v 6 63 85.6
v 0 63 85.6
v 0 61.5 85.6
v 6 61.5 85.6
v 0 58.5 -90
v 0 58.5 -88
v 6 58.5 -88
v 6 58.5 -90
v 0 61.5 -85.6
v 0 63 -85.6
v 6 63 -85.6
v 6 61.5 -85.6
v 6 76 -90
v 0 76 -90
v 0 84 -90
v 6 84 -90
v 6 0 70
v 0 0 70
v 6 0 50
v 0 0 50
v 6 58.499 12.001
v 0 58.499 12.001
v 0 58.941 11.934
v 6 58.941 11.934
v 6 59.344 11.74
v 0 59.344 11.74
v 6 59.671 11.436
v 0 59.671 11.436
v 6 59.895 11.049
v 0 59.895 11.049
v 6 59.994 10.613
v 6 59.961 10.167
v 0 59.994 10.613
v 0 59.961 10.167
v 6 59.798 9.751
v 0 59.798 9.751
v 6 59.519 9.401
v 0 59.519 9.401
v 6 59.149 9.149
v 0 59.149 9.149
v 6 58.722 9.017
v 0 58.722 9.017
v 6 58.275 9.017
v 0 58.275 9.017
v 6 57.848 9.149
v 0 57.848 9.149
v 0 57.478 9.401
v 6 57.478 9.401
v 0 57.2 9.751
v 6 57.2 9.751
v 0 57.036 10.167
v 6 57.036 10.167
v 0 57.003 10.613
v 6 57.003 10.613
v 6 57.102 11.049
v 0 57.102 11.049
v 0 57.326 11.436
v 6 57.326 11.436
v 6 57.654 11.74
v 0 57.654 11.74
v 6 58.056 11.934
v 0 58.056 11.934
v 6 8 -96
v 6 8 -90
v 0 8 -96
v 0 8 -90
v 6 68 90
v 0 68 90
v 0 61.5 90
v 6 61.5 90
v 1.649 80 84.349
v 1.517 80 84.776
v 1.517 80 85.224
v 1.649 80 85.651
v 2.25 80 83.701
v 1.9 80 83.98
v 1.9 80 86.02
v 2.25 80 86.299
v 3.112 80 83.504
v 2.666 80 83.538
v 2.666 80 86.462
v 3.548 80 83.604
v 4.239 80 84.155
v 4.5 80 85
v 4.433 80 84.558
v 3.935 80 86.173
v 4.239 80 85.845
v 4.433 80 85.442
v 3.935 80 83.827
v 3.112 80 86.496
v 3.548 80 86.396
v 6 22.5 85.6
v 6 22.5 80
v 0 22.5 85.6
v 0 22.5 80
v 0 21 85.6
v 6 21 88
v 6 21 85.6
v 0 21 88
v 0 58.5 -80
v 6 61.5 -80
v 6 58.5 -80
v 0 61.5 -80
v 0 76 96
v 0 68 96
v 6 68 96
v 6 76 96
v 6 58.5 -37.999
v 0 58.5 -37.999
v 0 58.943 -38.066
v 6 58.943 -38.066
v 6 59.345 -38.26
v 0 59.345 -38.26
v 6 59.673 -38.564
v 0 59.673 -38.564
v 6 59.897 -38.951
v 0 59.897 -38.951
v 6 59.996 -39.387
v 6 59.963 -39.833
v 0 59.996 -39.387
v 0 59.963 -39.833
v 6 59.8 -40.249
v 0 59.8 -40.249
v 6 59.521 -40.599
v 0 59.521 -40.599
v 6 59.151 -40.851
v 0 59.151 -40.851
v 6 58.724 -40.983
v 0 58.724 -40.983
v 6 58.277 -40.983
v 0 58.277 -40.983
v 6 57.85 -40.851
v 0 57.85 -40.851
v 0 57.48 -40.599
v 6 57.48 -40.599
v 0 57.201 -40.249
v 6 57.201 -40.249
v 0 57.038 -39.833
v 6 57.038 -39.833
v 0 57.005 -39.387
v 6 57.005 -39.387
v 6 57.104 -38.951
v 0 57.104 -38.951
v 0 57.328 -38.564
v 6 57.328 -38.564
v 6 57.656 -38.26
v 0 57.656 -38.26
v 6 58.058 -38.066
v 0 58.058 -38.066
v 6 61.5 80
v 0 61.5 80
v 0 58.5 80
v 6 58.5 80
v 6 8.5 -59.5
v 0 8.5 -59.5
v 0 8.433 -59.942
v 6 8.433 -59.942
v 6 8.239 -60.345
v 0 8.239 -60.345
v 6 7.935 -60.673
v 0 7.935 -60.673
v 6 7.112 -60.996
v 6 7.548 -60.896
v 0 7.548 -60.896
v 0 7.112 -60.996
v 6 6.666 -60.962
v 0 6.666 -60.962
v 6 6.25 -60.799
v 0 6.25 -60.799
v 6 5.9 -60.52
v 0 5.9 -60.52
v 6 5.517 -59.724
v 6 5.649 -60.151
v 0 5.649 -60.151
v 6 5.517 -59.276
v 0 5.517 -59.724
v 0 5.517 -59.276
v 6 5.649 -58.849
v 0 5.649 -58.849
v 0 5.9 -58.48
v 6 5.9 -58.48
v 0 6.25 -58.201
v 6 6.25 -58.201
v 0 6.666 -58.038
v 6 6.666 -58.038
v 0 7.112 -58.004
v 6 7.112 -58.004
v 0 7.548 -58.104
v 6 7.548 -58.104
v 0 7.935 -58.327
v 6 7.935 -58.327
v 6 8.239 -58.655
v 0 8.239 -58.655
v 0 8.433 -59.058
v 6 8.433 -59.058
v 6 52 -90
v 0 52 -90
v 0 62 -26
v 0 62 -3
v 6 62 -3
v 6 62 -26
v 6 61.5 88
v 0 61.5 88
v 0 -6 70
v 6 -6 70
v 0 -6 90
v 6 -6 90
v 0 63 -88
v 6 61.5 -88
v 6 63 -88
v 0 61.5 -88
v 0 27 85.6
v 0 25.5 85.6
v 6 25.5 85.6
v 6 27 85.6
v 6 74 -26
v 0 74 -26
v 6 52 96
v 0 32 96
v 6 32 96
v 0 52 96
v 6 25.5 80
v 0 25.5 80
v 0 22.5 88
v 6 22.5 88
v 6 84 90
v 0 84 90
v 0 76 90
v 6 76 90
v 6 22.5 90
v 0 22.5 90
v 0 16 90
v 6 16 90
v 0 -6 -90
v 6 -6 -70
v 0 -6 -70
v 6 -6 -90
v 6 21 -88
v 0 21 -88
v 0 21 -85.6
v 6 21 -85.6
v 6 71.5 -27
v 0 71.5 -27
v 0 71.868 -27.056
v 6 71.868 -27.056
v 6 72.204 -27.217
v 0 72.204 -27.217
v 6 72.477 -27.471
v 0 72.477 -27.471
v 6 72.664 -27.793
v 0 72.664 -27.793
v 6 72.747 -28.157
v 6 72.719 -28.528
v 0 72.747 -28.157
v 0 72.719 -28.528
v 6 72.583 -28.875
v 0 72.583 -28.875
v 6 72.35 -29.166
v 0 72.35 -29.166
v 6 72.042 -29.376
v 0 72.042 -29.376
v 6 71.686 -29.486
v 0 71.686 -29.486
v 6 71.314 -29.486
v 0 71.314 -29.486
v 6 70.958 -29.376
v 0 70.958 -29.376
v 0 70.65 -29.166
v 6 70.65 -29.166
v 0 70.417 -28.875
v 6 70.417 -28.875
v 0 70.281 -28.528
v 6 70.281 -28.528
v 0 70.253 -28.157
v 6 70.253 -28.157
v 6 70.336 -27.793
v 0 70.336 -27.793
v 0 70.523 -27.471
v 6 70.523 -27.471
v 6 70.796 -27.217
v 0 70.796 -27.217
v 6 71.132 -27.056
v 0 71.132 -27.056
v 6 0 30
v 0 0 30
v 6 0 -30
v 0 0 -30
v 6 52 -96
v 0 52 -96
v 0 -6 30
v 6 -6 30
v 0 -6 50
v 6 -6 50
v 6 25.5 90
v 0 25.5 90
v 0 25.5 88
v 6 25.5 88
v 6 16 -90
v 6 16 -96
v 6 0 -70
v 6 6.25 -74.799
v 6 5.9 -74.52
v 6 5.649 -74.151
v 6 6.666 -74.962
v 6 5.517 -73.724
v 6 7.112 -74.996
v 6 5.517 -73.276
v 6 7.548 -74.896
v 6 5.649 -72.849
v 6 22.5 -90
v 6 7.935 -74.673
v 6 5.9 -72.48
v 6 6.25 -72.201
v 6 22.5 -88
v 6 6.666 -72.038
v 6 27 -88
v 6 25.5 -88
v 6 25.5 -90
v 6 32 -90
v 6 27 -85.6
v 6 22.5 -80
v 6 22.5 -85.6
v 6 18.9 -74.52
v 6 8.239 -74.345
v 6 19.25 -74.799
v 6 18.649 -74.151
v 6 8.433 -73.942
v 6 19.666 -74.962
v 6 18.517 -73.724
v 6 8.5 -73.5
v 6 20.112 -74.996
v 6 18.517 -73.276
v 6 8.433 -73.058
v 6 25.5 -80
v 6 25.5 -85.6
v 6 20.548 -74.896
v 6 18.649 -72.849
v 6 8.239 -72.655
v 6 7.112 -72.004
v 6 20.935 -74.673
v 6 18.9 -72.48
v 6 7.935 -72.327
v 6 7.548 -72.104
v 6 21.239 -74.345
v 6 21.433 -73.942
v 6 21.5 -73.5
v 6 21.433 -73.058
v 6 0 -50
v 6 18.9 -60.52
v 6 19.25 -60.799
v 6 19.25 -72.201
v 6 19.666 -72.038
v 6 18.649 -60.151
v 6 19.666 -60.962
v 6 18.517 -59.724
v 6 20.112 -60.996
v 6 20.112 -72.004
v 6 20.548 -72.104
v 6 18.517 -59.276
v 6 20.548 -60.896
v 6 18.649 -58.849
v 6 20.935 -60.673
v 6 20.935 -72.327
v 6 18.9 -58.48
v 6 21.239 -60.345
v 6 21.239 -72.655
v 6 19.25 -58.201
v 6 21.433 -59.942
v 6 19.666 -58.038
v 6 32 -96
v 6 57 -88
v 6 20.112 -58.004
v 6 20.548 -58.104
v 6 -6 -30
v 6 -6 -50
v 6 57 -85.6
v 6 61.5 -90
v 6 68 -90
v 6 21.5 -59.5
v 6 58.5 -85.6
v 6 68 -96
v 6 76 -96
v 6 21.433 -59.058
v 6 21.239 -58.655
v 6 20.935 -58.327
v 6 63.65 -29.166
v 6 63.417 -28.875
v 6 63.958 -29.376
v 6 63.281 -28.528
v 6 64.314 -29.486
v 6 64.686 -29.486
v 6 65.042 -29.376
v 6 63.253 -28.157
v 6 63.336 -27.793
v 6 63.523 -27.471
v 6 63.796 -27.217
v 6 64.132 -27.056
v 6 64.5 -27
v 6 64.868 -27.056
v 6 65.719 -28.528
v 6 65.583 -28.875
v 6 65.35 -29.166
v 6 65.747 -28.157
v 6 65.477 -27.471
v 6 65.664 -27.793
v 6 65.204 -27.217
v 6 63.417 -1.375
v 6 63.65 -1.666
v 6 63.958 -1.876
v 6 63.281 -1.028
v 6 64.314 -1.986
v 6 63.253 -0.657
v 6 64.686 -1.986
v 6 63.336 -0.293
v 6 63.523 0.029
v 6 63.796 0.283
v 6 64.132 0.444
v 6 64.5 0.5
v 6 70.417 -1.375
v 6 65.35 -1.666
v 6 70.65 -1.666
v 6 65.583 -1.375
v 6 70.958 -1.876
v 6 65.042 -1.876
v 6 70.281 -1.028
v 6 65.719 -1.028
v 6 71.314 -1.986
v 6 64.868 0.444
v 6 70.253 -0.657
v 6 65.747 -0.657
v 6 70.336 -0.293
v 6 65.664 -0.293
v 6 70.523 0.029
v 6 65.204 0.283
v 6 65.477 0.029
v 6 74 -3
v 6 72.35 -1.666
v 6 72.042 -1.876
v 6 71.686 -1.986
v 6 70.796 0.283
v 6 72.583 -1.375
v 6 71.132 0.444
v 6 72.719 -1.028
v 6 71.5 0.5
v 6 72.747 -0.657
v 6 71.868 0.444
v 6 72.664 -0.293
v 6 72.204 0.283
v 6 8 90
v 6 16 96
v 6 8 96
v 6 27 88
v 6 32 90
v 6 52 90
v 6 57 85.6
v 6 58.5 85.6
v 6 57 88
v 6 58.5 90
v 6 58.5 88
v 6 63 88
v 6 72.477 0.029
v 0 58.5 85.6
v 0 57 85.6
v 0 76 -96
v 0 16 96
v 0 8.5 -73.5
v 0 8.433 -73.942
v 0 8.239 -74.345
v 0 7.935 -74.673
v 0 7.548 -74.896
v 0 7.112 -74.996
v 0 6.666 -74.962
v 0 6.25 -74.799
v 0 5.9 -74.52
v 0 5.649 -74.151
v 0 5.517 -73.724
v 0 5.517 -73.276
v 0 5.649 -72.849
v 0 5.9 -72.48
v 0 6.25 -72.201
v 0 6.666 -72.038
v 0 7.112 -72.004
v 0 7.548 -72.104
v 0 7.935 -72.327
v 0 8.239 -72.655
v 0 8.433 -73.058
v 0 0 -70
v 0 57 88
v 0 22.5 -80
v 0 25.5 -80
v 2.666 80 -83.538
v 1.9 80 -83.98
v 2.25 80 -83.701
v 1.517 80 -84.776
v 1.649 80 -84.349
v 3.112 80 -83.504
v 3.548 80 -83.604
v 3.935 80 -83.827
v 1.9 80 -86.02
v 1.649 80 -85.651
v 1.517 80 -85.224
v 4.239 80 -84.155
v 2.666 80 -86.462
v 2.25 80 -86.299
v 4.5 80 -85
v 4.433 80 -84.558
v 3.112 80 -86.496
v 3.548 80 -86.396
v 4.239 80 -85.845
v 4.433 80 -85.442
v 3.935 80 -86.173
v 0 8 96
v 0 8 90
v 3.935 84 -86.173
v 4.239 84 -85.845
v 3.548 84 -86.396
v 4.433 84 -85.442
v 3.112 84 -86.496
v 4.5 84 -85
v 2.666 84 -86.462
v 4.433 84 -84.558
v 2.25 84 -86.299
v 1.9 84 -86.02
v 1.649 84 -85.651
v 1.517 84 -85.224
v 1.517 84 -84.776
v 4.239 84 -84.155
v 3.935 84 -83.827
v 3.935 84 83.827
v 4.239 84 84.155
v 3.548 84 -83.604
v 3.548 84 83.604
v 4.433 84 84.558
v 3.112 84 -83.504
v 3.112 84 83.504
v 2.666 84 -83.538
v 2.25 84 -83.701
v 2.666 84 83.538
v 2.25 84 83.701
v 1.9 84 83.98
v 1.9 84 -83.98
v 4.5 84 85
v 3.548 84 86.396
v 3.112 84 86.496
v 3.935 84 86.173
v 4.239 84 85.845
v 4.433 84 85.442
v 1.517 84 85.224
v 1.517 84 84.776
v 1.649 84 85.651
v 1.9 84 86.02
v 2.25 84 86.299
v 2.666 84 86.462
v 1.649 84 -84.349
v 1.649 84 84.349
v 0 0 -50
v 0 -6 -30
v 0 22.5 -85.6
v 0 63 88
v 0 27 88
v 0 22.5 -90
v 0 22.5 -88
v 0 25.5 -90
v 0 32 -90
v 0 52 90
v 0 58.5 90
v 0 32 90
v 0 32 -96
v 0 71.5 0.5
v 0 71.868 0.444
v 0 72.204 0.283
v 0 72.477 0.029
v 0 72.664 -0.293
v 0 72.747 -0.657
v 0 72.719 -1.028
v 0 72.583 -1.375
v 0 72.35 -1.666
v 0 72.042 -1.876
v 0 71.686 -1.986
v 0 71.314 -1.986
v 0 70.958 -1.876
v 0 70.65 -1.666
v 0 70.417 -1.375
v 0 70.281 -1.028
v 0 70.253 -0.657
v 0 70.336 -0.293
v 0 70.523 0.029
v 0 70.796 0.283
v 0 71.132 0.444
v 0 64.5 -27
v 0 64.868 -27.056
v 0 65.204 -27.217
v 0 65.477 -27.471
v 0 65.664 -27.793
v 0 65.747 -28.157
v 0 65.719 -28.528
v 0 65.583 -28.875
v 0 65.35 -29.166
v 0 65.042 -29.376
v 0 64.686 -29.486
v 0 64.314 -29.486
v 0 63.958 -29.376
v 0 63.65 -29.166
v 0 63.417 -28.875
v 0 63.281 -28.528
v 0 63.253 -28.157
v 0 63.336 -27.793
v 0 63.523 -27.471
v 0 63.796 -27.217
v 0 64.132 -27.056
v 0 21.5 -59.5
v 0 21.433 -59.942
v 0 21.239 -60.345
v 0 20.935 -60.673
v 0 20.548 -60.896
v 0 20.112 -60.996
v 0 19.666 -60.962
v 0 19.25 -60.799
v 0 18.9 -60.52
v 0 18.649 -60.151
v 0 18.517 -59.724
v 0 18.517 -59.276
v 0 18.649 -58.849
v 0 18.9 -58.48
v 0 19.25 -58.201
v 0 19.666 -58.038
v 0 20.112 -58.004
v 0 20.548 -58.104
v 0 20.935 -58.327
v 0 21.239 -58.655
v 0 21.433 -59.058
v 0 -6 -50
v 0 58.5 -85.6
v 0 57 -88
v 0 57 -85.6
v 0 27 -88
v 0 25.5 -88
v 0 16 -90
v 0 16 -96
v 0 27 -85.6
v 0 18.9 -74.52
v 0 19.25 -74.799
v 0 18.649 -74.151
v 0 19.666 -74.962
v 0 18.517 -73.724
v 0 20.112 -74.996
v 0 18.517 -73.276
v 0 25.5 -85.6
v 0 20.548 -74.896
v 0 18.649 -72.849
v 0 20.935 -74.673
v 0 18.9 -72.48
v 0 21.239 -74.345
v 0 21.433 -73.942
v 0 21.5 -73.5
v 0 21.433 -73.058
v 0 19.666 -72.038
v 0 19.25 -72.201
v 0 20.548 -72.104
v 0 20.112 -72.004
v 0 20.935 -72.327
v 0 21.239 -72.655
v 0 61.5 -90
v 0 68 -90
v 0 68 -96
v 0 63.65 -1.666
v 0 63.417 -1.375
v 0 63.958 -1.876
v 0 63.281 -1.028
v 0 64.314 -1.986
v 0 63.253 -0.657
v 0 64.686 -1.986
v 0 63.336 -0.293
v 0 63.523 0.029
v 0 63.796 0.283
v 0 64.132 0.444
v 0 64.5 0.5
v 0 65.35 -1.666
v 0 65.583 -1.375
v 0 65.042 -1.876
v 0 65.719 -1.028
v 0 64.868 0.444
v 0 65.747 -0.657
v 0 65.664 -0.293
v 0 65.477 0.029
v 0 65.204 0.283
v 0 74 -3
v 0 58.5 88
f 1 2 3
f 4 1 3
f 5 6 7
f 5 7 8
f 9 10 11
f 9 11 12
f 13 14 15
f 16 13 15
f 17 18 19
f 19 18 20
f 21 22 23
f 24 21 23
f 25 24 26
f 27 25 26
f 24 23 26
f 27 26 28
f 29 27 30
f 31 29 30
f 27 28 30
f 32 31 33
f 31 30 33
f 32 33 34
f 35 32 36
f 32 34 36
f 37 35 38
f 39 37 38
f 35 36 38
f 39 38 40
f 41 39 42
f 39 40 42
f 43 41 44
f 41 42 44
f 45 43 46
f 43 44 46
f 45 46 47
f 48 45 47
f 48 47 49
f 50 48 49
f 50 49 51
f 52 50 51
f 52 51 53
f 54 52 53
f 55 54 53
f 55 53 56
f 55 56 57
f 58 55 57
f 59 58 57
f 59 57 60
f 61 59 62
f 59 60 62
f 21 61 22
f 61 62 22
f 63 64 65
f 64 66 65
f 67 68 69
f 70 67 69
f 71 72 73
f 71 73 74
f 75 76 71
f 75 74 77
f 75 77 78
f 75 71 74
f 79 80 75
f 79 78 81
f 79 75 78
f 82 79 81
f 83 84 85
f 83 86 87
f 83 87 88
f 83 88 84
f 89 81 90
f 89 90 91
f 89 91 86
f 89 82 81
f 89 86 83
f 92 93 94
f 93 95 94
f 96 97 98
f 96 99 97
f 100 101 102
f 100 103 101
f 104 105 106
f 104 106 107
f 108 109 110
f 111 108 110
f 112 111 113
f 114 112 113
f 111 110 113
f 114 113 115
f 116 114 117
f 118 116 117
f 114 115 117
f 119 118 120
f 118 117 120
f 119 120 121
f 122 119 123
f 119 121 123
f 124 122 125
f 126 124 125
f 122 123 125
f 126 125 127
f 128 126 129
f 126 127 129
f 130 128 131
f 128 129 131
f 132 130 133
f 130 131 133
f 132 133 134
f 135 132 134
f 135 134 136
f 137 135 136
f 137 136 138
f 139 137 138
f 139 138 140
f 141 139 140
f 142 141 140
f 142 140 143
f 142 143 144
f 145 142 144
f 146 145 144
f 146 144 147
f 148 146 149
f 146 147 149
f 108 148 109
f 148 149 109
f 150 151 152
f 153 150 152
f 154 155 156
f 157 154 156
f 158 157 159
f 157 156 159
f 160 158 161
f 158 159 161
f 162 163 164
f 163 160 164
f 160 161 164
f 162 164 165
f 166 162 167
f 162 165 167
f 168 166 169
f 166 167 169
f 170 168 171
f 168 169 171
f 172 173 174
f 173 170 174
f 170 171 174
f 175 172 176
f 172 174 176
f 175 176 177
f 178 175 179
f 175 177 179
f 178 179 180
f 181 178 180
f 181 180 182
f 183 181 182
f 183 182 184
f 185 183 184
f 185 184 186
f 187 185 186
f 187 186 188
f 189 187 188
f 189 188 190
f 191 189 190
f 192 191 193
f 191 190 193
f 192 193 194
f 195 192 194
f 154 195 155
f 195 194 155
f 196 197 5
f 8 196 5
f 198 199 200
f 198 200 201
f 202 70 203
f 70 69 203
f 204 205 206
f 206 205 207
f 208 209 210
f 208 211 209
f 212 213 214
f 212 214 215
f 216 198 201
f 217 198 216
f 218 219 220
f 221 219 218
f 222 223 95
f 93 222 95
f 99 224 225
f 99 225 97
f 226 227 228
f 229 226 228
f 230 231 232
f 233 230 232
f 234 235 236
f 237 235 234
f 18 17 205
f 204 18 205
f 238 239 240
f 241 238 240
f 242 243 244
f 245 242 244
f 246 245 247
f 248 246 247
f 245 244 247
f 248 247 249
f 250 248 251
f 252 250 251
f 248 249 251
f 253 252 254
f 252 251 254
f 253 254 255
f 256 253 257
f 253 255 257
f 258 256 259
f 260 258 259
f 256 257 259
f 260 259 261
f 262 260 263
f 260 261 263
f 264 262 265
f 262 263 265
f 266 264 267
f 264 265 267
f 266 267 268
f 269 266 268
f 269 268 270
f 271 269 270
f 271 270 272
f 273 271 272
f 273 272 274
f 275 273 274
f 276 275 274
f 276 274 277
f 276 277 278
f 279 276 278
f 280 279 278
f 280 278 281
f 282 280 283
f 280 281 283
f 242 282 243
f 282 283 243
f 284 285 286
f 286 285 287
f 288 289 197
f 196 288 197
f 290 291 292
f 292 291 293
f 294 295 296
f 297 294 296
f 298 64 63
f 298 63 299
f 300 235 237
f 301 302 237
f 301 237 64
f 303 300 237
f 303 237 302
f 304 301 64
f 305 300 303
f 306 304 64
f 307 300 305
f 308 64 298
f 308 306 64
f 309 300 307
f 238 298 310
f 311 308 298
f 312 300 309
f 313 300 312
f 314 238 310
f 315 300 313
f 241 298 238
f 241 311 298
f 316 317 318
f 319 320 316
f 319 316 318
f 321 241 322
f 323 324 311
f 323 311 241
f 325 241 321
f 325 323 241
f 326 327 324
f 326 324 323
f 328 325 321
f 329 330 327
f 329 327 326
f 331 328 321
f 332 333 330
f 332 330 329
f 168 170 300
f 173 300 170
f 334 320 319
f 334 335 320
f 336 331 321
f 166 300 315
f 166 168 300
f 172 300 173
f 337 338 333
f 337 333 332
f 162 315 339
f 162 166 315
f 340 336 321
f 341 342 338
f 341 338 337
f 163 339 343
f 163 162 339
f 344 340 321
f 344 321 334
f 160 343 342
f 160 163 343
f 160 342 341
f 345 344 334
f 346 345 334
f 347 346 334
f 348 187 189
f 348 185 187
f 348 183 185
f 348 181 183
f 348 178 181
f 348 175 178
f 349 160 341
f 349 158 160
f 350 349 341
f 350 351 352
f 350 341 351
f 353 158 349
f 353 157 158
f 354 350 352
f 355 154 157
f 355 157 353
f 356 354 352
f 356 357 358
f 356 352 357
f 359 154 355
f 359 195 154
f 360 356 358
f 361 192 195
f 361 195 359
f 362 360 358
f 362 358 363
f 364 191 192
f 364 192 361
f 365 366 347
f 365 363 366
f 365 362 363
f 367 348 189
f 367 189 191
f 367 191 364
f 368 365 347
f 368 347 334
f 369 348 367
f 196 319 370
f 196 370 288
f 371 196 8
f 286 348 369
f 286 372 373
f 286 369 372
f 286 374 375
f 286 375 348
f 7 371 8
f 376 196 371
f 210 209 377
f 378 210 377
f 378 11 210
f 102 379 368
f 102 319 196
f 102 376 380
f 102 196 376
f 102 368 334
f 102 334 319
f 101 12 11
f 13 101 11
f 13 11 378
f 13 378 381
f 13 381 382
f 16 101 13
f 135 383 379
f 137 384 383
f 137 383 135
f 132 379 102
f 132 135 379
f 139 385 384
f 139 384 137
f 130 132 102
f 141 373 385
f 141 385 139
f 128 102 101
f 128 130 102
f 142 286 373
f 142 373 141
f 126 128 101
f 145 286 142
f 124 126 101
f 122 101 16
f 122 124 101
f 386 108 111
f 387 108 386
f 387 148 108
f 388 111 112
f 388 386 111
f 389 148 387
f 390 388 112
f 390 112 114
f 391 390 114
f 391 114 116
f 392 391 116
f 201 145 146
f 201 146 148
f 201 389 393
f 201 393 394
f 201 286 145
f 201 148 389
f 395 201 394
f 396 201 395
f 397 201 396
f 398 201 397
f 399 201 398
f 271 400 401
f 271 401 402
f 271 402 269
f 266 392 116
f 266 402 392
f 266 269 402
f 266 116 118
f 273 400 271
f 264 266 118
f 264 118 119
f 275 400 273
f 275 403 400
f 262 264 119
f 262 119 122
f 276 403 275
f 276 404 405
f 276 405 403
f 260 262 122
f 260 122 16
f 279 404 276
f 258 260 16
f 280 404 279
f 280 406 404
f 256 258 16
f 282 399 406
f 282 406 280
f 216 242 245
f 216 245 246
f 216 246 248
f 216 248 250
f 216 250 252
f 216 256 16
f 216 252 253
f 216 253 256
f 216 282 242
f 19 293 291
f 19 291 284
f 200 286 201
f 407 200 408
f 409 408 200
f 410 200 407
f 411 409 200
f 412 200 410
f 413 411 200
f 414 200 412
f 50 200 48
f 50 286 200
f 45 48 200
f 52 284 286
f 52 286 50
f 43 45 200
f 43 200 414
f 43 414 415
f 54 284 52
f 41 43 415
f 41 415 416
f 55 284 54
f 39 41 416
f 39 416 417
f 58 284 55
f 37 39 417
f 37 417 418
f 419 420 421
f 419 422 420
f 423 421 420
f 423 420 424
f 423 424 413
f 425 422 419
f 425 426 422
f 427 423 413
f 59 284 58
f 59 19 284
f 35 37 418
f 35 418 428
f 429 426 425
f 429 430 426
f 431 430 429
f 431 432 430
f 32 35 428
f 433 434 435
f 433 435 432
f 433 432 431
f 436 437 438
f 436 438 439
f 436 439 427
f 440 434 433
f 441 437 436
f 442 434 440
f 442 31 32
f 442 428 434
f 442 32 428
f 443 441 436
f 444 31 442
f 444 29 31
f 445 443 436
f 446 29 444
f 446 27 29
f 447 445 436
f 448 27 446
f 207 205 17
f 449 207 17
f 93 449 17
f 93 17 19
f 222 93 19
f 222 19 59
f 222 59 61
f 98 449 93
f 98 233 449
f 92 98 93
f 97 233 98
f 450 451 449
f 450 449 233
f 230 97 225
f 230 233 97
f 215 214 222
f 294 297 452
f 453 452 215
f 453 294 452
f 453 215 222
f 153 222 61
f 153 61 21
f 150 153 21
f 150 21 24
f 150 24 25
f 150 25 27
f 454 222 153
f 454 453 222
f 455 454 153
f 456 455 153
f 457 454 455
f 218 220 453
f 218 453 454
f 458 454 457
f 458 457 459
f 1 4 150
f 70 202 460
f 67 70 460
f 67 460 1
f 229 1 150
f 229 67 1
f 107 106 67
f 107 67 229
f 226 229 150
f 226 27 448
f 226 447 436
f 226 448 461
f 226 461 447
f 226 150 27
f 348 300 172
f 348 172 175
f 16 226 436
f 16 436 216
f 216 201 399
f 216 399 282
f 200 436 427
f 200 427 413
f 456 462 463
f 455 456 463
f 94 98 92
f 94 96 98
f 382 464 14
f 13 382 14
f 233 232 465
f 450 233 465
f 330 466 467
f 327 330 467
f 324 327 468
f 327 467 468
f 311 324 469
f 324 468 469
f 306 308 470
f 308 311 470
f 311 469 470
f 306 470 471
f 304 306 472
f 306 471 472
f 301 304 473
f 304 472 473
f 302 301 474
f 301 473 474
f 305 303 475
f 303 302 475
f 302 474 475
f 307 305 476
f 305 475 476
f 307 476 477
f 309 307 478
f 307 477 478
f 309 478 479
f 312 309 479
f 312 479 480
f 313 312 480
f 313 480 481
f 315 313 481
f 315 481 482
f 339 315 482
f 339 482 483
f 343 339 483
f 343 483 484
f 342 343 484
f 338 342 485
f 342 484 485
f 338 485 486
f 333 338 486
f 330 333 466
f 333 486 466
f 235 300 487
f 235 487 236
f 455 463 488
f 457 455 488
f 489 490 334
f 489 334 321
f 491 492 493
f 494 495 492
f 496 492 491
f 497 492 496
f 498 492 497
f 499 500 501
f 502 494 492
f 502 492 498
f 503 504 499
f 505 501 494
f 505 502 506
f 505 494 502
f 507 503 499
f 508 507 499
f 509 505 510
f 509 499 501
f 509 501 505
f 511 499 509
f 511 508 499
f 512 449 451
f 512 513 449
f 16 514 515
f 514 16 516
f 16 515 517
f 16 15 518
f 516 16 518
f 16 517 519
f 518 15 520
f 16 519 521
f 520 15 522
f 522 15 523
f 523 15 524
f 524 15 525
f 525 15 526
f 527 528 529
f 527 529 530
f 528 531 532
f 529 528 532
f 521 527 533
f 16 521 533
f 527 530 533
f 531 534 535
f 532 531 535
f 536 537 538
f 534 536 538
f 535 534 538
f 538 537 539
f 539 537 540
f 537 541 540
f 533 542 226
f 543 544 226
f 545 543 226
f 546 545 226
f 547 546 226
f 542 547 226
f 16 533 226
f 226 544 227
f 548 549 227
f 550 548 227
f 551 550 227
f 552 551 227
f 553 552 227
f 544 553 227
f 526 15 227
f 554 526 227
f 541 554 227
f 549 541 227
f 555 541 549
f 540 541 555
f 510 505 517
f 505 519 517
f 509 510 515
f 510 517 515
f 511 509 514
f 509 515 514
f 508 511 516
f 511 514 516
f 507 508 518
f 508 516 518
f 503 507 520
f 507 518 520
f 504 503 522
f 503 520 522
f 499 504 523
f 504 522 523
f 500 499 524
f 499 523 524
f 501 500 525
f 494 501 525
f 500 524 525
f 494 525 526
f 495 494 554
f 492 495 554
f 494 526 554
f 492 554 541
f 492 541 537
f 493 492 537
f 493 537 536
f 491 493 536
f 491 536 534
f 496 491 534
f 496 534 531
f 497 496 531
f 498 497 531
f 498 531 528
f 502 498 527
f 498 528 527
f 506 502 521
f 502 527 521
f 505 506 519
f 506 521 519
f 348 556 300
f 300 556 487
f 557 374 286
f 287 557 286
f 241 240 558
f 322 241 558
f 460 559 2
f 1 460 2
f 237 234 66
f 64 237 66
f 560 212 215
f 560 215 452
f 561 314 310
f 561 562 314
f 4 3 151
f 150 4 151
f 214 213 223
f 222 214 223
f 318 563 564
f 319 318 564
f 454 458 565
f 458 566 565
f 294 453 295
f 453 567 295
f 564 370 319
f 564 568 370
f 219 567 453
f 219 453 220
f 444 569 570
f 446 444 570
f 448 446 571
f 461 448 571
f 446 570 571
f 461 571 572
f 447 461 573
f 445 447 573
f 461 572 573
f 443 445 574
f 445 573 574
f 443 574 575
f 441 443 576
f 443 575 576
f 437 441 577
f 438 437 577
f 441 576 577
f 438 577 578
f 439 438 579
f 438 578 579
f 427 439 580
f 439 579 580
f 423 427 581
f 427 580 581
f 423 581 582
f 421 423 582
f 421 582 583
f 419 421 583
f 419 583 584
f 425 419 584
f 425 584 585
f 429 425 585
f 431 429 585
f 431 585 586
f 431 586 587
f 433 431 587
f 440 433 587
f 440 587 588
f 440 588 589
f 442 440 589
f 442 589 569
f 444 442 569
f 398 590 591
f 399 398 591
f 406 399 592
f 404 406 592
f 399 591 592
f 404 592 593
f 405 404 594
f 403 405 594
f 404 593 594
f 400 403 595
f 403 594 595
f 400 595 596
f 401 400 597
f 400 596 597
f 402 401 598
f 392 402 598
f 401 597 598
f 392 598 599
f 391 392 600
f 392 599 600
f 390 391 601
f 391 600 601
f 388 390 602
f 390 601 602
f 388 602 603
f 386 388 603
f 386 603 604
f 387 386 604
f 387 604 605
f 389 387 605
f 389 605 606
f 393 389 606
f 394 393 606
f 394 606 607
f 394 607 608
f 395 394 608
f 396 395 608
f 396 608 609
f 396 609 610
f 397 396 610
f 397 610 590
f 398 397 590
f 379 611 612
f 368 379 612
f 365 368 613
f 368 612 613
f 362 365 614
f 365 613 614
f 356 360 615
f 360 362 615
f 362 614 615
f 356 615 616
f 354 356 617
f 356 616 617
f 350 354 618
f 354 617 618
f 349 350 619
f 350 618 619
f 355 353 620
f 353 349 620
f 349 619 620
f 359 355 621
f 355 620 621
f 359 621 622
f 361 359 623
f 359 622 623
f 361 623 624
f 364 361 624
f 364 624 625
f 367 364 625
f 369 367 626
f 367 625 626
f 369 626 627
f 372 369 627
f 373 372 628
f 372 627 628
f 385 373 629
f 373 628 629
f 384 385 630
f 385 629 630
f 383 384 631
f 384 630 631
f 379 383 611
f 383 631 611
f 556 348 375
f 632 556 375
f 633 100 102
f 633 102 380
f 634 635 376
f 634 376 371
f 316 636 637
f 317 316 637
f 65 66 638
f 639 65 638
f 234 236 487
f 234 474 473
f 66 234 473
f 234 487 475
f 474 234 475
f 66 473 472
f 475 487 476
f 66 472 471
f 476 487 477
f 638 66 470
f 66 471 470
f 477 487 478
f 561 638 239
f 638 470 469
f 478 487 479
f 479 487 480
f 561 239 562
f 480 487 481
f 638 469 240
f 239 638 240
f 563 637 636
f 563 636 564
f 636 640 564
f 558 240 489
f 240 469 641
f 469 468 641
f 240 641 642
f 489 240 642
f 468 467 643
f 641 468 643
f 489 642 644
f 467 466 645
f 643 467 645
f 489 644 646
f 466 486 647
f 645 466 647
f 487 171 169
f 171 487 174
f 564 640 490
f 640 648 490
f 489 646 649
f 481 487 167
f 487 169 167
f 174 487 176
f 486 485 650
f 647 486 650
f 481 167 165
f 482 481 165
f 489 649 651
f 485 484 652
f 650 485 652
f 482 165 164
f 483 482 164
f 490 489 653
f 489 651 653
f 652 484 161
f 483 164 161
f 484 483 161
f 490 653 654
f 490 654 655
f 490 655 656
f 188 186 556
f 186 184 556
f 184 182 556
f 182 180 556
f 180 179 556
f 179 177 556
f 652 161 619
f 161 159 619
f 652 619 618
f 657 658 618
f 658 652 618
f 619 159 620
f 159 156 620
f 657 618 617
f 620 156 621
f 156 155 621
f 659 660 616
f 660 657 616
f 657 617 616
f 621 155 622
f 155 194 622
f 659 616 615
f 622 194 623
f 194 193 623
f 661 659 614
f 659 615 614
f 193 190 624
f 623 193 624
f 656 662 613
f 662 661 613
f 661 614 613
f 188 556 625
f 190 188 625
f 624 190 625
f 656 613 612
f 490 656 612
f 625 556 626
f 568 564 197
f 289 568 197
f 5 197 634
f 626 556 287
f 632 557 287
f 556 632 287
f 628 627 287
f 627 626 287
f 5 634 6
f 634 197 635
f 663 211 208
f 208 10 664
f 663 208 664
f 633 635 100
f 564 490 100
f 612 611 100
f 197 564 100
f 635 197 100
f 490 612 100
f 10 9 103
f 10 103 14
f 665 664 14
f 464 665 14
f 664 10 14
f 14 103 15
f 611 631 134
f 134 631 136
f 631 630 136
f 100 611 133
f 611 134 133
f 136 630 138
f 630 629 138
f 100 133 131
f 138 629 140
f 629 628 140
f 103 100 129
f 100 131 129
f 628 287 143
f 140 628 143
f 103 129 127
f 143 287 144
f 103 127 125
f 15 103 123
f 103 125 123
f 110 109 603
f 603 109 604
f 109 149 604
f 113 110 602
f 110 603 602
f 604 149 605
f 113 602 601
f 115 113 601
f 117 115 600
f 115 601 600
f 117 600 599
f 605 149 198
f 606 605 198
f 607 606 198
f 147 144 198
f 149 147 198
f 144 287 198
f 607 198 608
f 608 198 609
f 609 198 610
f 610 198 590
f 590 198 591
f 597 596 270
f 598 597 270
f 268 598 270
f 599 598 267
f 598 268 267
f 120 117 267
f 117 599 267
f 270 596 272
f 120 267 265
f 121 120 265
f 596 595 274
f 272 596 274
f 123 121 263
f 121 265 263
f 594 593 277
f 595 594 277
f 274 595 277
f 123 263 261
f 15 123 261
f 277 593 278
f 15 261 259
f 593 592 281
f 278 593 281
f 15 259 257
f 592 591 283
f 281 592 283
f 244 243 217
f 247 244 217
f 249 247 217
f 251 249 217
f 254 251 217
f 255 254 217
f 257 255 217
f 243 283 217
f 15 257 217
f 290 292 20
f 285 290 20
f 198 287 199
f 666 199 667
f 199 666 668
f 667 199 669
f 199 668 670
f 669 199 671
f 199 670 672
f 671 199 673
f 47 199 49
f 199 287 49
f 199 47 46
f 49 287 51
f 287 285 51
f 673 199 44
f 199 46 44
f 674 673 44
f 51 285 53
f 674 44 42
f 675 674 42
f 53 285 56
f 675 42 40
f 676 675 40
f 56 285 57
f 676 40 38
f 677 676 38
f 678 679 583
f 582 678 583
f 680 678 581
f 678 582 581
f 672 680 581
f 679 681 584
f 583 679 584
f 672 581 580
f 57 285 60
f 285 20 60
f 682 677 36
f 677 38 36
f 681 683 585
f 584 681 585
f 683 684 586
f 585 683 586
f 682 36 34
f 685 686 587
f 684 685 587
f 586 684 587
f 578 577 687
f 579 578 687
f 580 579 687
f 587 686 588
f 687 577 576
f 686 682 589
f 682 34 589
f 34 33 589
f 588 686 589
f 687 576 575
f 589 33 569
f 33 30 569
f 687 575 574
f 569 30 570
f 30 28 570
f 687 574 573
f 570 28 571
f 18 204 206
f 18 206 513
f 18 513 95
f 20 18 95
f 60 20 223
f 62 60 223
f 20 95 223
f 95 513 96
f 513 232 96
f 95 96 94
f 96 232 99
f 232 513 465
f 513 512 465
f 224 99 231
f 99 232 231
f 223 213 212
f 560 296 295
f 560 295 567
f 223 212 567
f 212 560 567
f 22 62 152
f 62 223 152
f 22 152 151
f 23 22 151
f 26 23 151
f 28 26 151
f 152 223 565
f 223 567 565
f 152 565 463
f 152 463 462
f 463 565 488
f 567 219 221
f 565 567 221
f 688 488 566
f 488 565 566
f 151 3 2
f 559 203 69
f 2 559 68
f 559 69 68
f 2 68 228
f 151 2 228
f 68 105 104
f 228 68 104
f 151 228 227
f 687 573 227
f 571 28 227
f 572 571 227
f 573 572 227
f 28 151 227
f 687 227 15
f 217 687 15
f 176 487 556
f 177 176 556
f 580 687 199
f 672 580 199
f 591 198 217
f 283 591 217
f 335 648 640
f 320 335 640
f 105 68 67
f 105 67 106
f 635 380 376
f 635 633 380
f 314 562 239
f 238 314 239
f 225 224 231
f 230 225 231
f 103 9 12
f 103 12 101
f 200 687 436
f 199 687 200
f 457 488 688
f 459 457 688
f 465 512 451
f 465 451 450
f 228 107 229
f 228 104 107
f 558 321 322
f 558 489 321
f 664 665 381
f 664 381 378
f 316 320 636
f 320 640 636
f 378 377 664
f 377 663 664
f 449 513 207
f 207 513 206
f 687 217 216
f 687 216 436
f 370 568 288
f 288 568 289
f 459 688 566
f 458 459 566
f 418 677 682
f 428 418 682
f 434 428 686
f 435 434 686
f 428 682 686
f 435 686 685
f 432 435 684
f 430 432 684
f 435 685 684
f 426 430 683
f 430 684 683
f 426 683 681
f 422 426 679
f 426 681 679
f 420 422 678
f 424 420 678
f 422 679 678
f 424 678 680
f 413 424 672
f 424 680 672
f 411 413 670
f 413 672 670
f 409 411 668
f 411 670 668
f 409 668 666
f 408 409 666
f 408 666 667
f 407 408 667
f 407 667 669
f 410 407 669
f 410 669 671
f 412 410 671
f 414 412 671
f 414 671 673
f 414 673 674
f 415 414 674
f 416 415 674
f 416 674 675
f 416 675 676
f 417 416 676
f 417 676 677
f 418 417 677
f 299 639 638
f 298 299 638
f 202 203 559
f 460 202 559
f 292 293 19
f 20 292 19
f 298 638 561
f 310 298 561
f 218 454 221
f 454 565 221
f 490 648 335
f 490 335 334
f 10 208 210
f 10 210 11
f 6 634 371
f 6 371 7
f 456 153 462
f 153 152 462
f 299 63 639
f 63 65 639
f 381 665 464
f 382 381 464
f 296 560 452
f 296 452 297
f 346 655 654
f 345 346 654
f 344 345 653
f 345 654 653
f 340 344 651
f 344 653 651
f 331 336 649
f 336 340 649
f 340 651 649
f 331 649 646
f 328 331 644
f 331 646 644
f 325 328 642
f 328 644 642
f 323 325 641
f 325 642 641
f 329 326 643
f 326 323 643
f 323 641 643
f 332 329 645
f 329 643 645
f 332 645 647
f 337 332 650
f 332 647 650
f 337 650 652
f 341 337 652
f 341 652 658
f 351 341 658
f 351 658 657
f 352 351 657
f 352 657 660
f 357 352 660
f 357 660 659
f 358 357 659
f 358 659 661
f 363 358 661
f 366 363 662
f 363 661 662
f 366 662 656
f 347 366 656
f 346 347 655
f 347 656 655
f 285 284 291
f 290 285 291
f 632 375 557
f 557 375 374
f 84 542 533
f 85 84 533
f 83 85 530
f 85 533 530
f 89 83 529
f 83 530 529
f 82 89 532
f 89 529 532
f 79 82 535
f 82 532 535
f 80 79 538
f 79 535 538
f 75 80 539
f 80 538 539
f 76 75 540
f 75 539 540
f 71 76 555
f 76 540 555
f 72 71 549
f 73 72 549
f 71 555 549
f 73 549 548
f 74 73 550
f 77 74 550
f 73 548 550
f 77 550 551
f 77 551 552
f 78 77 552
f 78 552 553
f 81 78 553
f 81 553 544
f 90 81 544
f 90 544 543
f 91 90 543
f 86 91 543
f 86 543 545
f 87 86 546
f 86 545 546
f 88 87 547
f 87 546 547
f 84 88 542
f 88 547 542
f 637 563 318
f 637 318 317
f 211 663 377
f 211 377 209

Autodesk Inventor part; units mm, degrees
ref_plane "YZ Plane" through (0, 0, 0) normal (1, 0, 0) x (0, 1, 0)
ref_plane "XZ Plane" through (0, 0, 0) normal (0, 1, 0) x (-1, 0, 0)
ref_plane "XY Plane" through (0, 0, 0) normal (0, 0, 1) x (1, 0, 0)
sketch "Эскиз1" plane through (0, 0, 0) normal (1, 0, 0) x (0, 1, 0)
  line L0 (84, 90) -> (0, 90)
  line L1 (0, 90) -> (0, -90)
  line L2 (0, -90) -> (84, -90)
  line L3 (84, -90) -> (84, 90)
  line L4 (76, 90) -> (8, 90)
  line L5 (8, 90) -> (8, 96)
  line L6 (8, 96) -> (76, 96)
  line L7 (76, 96) -> (76, 90)
  line L8 (76, -90) -> (8, -90)
  line L9 (8, -90) -> (8, -96)
  line L10 (8, -96) -> (76, -96)
  line L11 (76, -96) -> (76, -90)
  line L12 (16, -96) -> (16, -90)
  line L13 (32, -96) -> (32, -90)
  line L14 (68, -96) -> (68, -90)
  line L15 (52, -96) -> (52, -90)
  line L16 (16, 90) -> (16, 96)
  line L17 (32, 90) -> (32, 96)
  line L18 (68, 90) -> (68, 96)
  line L19 (52, 90) -> (52, 96)
  circle A0 centre (20, -59.5) radius 1.5
  circle A1 centre (20, -73.5) radius 1.5
  circle A2 centre (7, -59.5) radius 1.5
  circle A3 centre (7, -73.5) radius 1.5
  line L20 (20, -59.5) -> (0, -59.5) construction
  line L21 (7, -59.5) -> (7, -73.5) construction
  line L22 (20, -73.5) -> (0, -73.5) construction
  point P0 (0, 0)
  point P1 (76, 93)
  point P2 (8, 93)
  point P3 (8, -90)
  point P4 (68, -93)
  point P5 (76, -93)
  point P6 (52, -93)
  point P7 (16, -93)
  point P8 (8, -93)
  point P9 (32, -93)
  point P10 (68, 93)
  point P11 (52, 93)
  point P12 (16, 93)
  point P13 (32, 93)
  dimension "d0" = 180
  dimension "d1" = 84
  dimension "d2" = 90
  dimension "d3" = 0
  dimension "d4" = 6
  dimension "d5" = 8
  dimension "d6" = 8
  dimension "d7" = 6
  dimension "d40" = 8
  dimension "d41" = 16
  dimension "d42" = 8
  dimension "d43" = 16
  dimension "d44" = 8
  dimension "d45" = 16
  dimension "d46" = 16
  dimension "d47" = 8
  dimension "d76" = 14
  dimension "d77" = 3
  dimension "d78" = 3
  dimension "d79" = 20
  dimension "d80" = 20
  dimension "d81" = 3
  dimension "d82" = 3
  dimension "d83" = 13
  dimension "d84" = 13
  dimension "d85" = 16.5
extrude "Выдавливание1" add sketch "Эскиз1" along normal blind 6 contours L3 L2 L1 L0 | L0 L18 L6 L7 | L11 L10 L14 L2 | L0 L17 L6 L19 | L15 L10 L13 L2 | L0 L5 L6 L16 | L12 L10 L9 L2
sketch "Эскиз4" plane through (0, 84, 90) normal (0, 1, 0) x (1, 0, 0)
  circle A0 centre (3, 5) radius 1.5
  circle A1 centre (3, 175) radius 1.5
  line L0 (0, 0) -> (6, 0)
  line L1 (6, 180) -> (6, 0)
  line L2 (0, 180) -> (6, 180)
  line L3 (6, 180) -> (6, 0) projected
  line L4 (0, 0) -> (6, 0) projected
  line L5 (0, 180) -> (6, 180) projected
  point P0 (0, 90)
  point P1 (3, 0)
  dimension "d30" = 3
  dimension "d31" = 3
  dimension "d32" = 5
  dimension "d33" = 3
  dimension "d34" = 5
  dimension "d35" = 3
  dimension "d36" = 6
  dimension "d37" = 6
extrude "Выдавливание4" cut sketch "Эскиз4" against normal blind 4
sketch "Эскиз6" plane through (6, 0, 0) normal (1, 0, 0) x (0, 0, -1)
  line L0 (-90, 8) -> (-90, 0) projected
  line L1 (-90, 0) -> (-70, 0)
  line L2 (-70, 0) -> (-70, -6)
  line L3 (-70, -6) -> (-90, -6)
  line L4 (-90, -6) -> (-90, 0)
  line L5 (-90, 0) -> (90, 0) projected
  line L6 (-50, 0) -> (-30, 0)
  line L7 (-30, 0) -> (-30, -6)
  line L8 (-30, -6) -> (-50, -6)
  line L9 (-50, -6) -> (-50, 0)
  line L10 (30, 0) -> (50, 0)
  line L11 (50, 0) -> (50, -6)
  line L12 (50, -6) -> (30, -6)
  line L13 (30, -6) -> (30, 0)
  line L14 (90, 0) -> (70, 0)
  line L15 (70, 0) -> (70, -6)
  line L16 (70, -6) -> (90, -6)
  line L17 (90, -6) -> (90, 0)
  point P0 (0, 0)
  point P1 (-80, -6)
  point P2 (-50, -3)
  point P3 (-70, -3)
  point P4 (-30, -3)
  point P5 (90, -3)
  point P6 (70, -3)
  point P7 (50, -3)
  dimension "d48" = 6
  dimension "d49" = 6
  dimension "d50" = 6
  dimension "d51" = 20
  dimension "d52" = 20
  dimension "d53" = 20
  dimension "d54" = 20
  dimension "d55" = 20
  dimension "d56" = 20
extrude "Выдавливание5" add sketch "Эскиз6" against normal blind 6
sketch "Эскиз8" plane through (0, 0, 0) normal (-1, 0, 0) x (0, 0, 1)
  line L0 (-26, 74) -> (-3, 74)
  line L1 (-3, 74) -> (-3, 62)
  line L2 (-3, 62) -> (-26, 62)
  line L3 (-26, 62) -> (-26, 74)
  circle A0 centre (-28.25, 71.5) radius 1.25
  circle A1 centre (-28.25, 64.5) radius 1.25
  circle A2 centre (-0.75, 71.5) radius 1.25
  circle A3 centre (-0.75, 64.5) radius 1.25
  line L4 (-90, 84) -> (90, 84) projected
  line L5 (-96, 68) -> (-96, 76) projected
  point P0 (0, 0)
  point P1 (-26, 68)
  dimension "d86" = 23
  dimension "d87" = 12
  dimension "d88" = 2.5
  dimension "d89" = 2.5
  dimension "d90" = 2.5
  dimension "d91" = 2.5
  dimension "d92" = 27.5
  dimension "d93" = 2.5
  dimension "d94" = 7
  dimension "d95" = 2.25
  dimension "d96" = 7
  dimension "d97" = 27.5
  dimension "d98" = 10
  dimension "d99" = 2.5
  dimension "d100" = 70
  dimension "d101" = 1
extrude "Выдавливание7" cut sketch "Эскиз8" against normal blind 10
sketch "Эскиз9" plane through (0, 0, 0) normal (-1, 0, 0) x (0, 0, 1)
  circle A0 centre (-39.4994, 58.5005) radius 1.5 projected
  circle A1 centre (10.5006, 58.4986) radius 1.5 projected
  circle A2 centre (-39.4994, 58.5005) radius 1.5
  circle A3 centre (10.5006, 58.4986) radius 1.5
  point P0 (0, 0)
extrude "Выдавливание8" cut sketch "Эскиз9" against normal blind 10
sketch "Эскиз10" plane through (0, 0, 0) normal (-1, 0, 0) x (0, 0, 1)
  line L0 (90, 61.5) -> (80, 61.5)
  line L1 (80, 61.5) -> (80, 58.5)
  line L2 (80, 58.5) -> (90, 58.5)
  line L3 (90, 58.5) -> (90, 61.5)
  line L4 (85.6, 57) -> (88, 57)
  line L5 (88, 57) -> (88, 63)
  line L6 (88, 63) -> (85.6, 63)
  line L7 (85.6, 63) -> (85.6, 57)
  line L8 (90, 25.5) -> (80, 25.5)
  line L9 (80, 25.5) -> (80, 22.5)
  line L10 (80, 22.5) -> (90, 22.5)
  line L11 (90, 22.5) -> (90, 25.5)
  line L12 (85.6, 27) -> (88, 27)
  line L13 (88, 27) -> (88, 21)
  line L14 (88, 21) -> (85.6, 21)
  line L15 (85.6, 21) -> (85.6, 27)
  circle A0 centre (10.5006, 58.4986) radius 1.5 projected
  circle A1 centre (-39.4994, 58.5005) radius 1.5 projected
  circle A2 centre (-28.25, 64.5) radius 1.25 projected
  circle A3 centre (-0.75, 71.5) radius 1.25 projected
  circle A4 centre (-28.25, 71.5) radius 1.25 projected
  circle A5 centre (-0.75, 64.5) radius 1.25 projected
  line L16 (-26, 74) -> (-26, 62) projected
  line L17 (-26, 62) -> (-3, 62) projected
  line L18 (-3, 62) -> (-3, 74) projected
  line L19 (-3, 74) -> (-26, 74) projected
  circle A6 centre (-73.5, 7) radius 1.5 projected
  circle A7 centre (-59.5, 7) radius 1.5 projected
  circle A8 centre (-73.5, 20) radius 1.5 projected
  circle A9 centre (-59.5, 20) radius 1.5 projected
  line L20 (90, 52) -> (96, 52) projected
  line L21 (96, 52) -> (96, 32) projected
  line L22 (96, 32) -> (90, 32) projected
  line L23 (90, 32) -> (90, 16) projected
  line L24 (90, 16) -> (96, 16) projected
  line L25 (96, 16) -> (96, 8) projected
  line L26 (96, 8) -> (90, 8) projected
  line L27 (90, 8) -> (90, -6) projected
  line L28 (90, -6) -> (70, -6) projected
  line L29 (70, -6) -> (70, 0) projected
  line L30 (70, 0) -> (50, 0) projected
  line L31 (50, 0) -> (50, -6) projected
  line L32 (50, -6) -> (30, -6) projected
  line L33 (30, -6) -> (30, 0) projected
  line L34 (30, 0) -> (-30, 0) projected
  line L35 (-30, 0) -> (-30, -6) projected
  line L36 (-30, -6) -> (-50, -6) projected
  line L37 (-50, -6) -> (-50, 0) projected
  line L38 (-50, 0) -> (-70, 0) projected
  line L39 (-70, 0) -> (-70, -6) projected
  line L40 (-70, -6) -> (-90, -6) projected
  line L41 (-90, -6) -> (-90, 8) projected
  line L42 (-90, 8) -> (-96, 8) projected
  line L43 (-96, 8) -> (-96, 16) projected
  line L44 (-96, 16) -> (-90, 16) projected
  line L45 (-90, 16) -> (-90, 32) projected
  line L46 (-90, 32) -> (-96, 32) projected
  line L47 (-96, 32) -> (-96, 52) projected
  line L48 (-96, 52) -> (-90, 52) projected
  line L49 (-90, 52) -> (-90, 68) projected
  line L50 (-90, 68) -> (-96, 68) projected
  line L51 (-96, 68) -> (-96, 76) projected
  line L52 (-96, 76) -> (-90, 76) projected
  line L53 (-90, 76) -> (-90, 84) projected
  line L54 (-90, 84) -> (90, 84) projected
  line L55 (90, 84) -> (90, 76) projected
  line L56 (90, 76) -> (96, 76) projected
  line L57 (96, 76) -> (96, 68) projected
  line L58 (96, 68) -> (90, 68) projected
  line L59 (90, 68) -> (90, 52) projected
  circle A10 centre (10.5006, 58.4986) radius 1.5 projected
  circle A11 centre (-39.4994, 58.5005) radius 1.5 projected
  circle A12 centre (-28.25, 64.5) radius 1.25 projected
  circle A13 centre (-0.75, 71.5) radius 1.25 projected
  circle A14 centre (-28.25, 71.5) radius 1.25 projected
  circle A15 centre (-0.75, 64.5) radius 1.25 projected
  line L60 (-26, 74) -> (-26, 62) projected
  line L61 (-26, 62) -> (-3, 62) projected
  line L62 (-3, 62) -> (-3, 74) projected
  line L63 (-3, 74) -> (-26, 74) projected
  circle A16 centre (-73.5, 7) radius 1.5 projected
  circle A17 centre (-59.5, 7) radius 1.5 projected
  circle A18 centre (-73.5, 20) radius 1.5 projected
  circle A19 centre (-59.5, 20) radius 1.5 projected
  line L64 (90, 52) -> (96, 52) projected
  line L65 (96, 52) -> (96, 32) projected
  line L66 (96, 32) -> (90, 32) projected
  line L67 (90, 32) -> (90, 16) projected
  line L68 (90, 16) -> (96, 16) projected
  line L69 (96, 16) -> (96, 8) projected
  line L70 (96, 8) -> (90, 8) projected
  line L71 (90, 8) -> (90, -6) projected
  line L72 (90, -6) -> (70, -6) projected
  line L73 (70, -6) -> (70, 0) projected
  line L74 (70, 0) -> (50, 0) projected
  line L75 (50, 0) -> (50, -6) projected
  line L76 (50, -6) -> (30, -6) projected
  line L77 (30, -6) -> (30, 0) projected
  line L78 (30, 0) -> (-30, 0) projected
  line L79 (-30, 0) -> (-30, -6) projected
  line L80 (-30, -6) -> (-50, -6) projected
  line L81 (-50, -6) -> (-50, 0) projected
  line L82 (-50, 0) -> (-70, 0) projected
  line L83 (-70, 0) -> (-70, -6) projected
  line L84 (-70, -6) -> (-90, -6) projected
  line L85 (-90, -6) -> (-90, 8) projected
  line L86 (-90, 8) -> (-96, 8) projected
  line L87 (-96, 8) -> (-96, 16) projected
  line L88 (-96, 16) -> (-90, 16) projected
  line L89 (-90, 16) -> (-90, 32) projected
  line L90 (-90, 32) -> (-96, 32) projected
  line L91 (-96, 32) -> (-96, 52) projected
  line L92 (-96, 52) -> (-90, 52) projected
  line L93 (-90, 52) -> (-90, 68) projected
  line L94 (-90, 68) -> (-96, 68) projected
  line L95 (-96, 68) -> (-96, 76) projected
  line L96 (-96, 76) -> (-90, 76) projected
  line L97 (-90, 76) -> (-90, 84) projected
  line L98 (-90, 84) -> (90, 84) projected
  line L99 (90, 84) -> (90, 76) projected
  line L100 (90, 76) -> (96, 76) projected
  line L101 (96, 76) -> (96, 68) projected
  line L102 (96, 68) -> (90, 68) projected
  line L103 (90, 68) -> (90, 52) projected
  circle A20 centre (10.5006, 58.4986) radius 1.5 projected
  circle A21 centre (-39.4994, 58.5005) radius 1.5 projected
  circle A22 centre (-28.25, 64.5) radius 1.25 projected
  circle A23 centre (-0.75, 71.5) radius 1.25 projected
  circle A24 centre (-28.25, 71.5) radius 1.25 projected
  circle A25 centre (-0.75, 64.5) radius 1.25 projected
  line L104 (-3, 74) -> (-3, 62) projected
  line L105 (-3, 62) -> (-26, 62) projected
  line L106 (-26, 62) -> (-26, 74) projected
  line L107 (-26, 74) -> (-3, 74) projected
  line L108 (96, 52) -> (96, 32) projected
  line L109 (90, 52) -> (96, 52) projected
  line L110 (90, 68) -> (90, 52) projected
  line L111 (96, 68) -> (90, 68) projected
  line L112 (96, 76) -> (96, 68) projected
  line L113 (90, 76) -> (96, 76) projected
  line L114 (90, 84) -> (90, 76) projected
  line L115 (-90, 84) -> (90, 84) projected
  line L116 (-90, 76) -> (-90, 84) projected
  line L117 (-96, 76) -> (-90, 76) projected
  line L118 (-96, 68) -> (-96, 76) projected
  line L119 (-90, 68) -> (-96, 68) projected
  line L120 (-90, 52) -> (-90, 68) projected
  line L121 (-96, 52) -> (-90, 52) projected
  line L122 (-96, 32) -> (-96, 52) projected
  line L123 (-90, 32) -> (-96, 32) projected
  line L124 (-90, 16) -> (-90, 32) projected
  line L125 (-96, 16) -> (-90, 16) projected
  line L126 (-96, 8) -> (-96, 16) projected
  line L127 (-90, 8) -> (-96, 8) projected
  line L128 (-90, 8) -> (-90, -6) projected
  line L129 (-90, -6) -> (-70, -6) projected
  line L130 (-70, -6) -> (-70, 0) projected
  line L131 (-50, 0) -> (-70, 0) projected
  line L132 (-50, 0) -> (-50, -6) projected
  line L133 (-50, -6) -> (-30, -6) projected
  line L134 (-30, -6) -> (-30, 0) projected
  line L135 (30, 0) -> (-30, 0) projected
  line L136 (30, 0) -> (30, -6) projected
  line L137 (30, -6) -> (50, -6) projected
  line L138 (50, -6) -> (50, 0) projected
  line L139 (70, 0) -> (50, 0) projected
  line L140 (70, 0) -> (70, -6) projected
  line L141 (70, -6) -> (90, -6) projected
  line L142 (90, 8) -> (90, -6) projected
  line L143 (96, 8) -> (90, 8) projected
  line L144 (96, 16) -> (96, 8) projected
  line L145 (90, 16) -> (96, 16) projected
  line L146 (90, 32) -> (90, 16) projected
  line L147 (96, 32) -> (90, 32) projected
  circle A26 centre (-59.5, 20) radius 1.5 projected
  circle A27 centre (-73.5, 20) radius 1.5 projected
  circle A28 centre (-59.5, 7) radius 1.5 projected
  circle A29 centre (-73.5, 7) radius 1.5 projected
  line L148 (90, 68) -> (90, 52) projected
  line L149 (0, 84) -> (0, 0) construction
  line L150 (-90, 61.5) -> (-80, 61.5)
  line L151 (-80, 61.5) -> (-80, 58.5)
  line L152 (-80, 58.5) -> (-90, 58.5)
  line L153 (-90, 58.5) -> (-90, 61.5)
  line L154 (-85.6, 57) -> (-88, 57)
  line L155 (-88, 57) -> (-88, 63)
  line L156 (-88, 63) -> (-85.6, 63)
  line L157 (-85.6, 63) -> (-85.6, 57)
  line L158 (-90, 25.5) -> (-80, 25.5)
  line L159 (-80, 25.5) -> (-80, 22.5)
  line L160 (-80, 22.5) -> (-90, 22.5)
  line L161 (-90, 22.5) -> (-90, 25.5)
  line L162 (-85.6, 27) -> (-88, 27)
  line L163 (-88, 27) -> (-88, 21)
  line L164 (-88, 21) -> (-85.6, 21)
  line L165 (-85.6, 21) -> (-85.6, 27)
  line L166 (-90, 52) -> (-96, 52)
  line L167 (-96, 52) -> (-96, 32)
  line L168 (-96, 32) -> (-90, 32)
  line L169 (-90, 32) -> (-90, 16)
  line L170 (-90, 16) -> (-96, 16)
  line L171 (-90, 52) -> (-96, 52)
  line L172 (-96, 52) -> (-96, 32)
  line L173 (-96, 32) -> (-90, 32)
  line L174 (-90, 32) -> (-90, 16)
  line L175 (-90, 16) -> (-96, 16)
  line L176 (-96, 52) -> (-96, 32)
  line L177 (-90, 52) -> (-96, 52)
  line L178 (-90, 16) -> (-96, 16)
  line L179 (-90, 32) -> (-90, 16)
  line L180 (-96, 32) -> (-90, 32)
  point P0 (93, 68)
  point P1 (93, 52)
  point P2 (93, 32)
  point P3 (-93, 52)
  point P4 (-93, 32)
  point P5 (85.6, 22.5)
  point P6 (88, 22.5)
  point P7 (88, 25.5)
  point P8 (85.6, 25.5)
  point P9 (85.6, 58.5)
  point P10 (88, 58.5)
  point P11 (88, 61.5)
  point P12 (85.6, 61.5)
  point P13 (-85.6, 25.5)
  point P14 (-88, 25.5)
  point P15 (-88, 22.5)
  point P16 (-85.6, 22.5)
  point P17 (-85.6, 61.5)
  point P18 (-88, 61.5)
  point P19 (-88, 58.5)
  point P20 (-85.6, 58.5)
  dimension "d106" = 6
  dimension "d107" = 2.4
  dimension "d108" = 10
  dimension "d109" = 3
  dimension "d110" = 1.5
  dimension "d111" = 5.6
  dimension "d112" = 10
  dimension "d113" = 3
  dimension "d114" = 1.5
  dimension "d115" = 6
  dimension "d116" = 5.6
  dimension "d117" = 2.4
  dimension "d118" = 6.5
  dimension "d120" = 6.5
extrude "Выдавливание9" cut sketch "Эскиз10" against normal blind 10 contours L3 L2 L5 L0 | L5 L2 L7 L0 | L0 L7 L6 L5 | L7 L2 L1 L0 | L5 L4 L7 L2 | L11 L10 L13 L8 | L13 L10 L15 L8 | L8 L15 L12 L13 | L15 L10 L9 L8 | L13 L14 L15 L10 | L150 L155 L152 L49 | L155 L156 L157 L150 | L150 L157 L152 L155 | L152 L157 L154 L155 | L150 L151 L152 L157 | L158 L163 L160 L45 | L163 L162 L165 L158 | L158 L165 L160 L163 | L160 L165 L164 L163 | L158 L159 L160 L165
equation "\"d2\" = 0.5 * d0"
equation "\"d42\" = d40"
equation "\"d43\" = d41"
equation "\"d44\" = d40"
equation "\"d45\" = d41"
equation "\"d46\" = d41"
equation "\"d47\" = d40"
equation "\"d52\" = d51"
equation "\"d53\" = d51"
equation "\"d54\" = d51"
equation "\"d55\" = d51"
equation "\"d56\" = d51"
equation "\"d89\" = d88"
equation "\"d90\" = d88"
equation "\"d91\" = d88"
properties part number "передняя стенка"
